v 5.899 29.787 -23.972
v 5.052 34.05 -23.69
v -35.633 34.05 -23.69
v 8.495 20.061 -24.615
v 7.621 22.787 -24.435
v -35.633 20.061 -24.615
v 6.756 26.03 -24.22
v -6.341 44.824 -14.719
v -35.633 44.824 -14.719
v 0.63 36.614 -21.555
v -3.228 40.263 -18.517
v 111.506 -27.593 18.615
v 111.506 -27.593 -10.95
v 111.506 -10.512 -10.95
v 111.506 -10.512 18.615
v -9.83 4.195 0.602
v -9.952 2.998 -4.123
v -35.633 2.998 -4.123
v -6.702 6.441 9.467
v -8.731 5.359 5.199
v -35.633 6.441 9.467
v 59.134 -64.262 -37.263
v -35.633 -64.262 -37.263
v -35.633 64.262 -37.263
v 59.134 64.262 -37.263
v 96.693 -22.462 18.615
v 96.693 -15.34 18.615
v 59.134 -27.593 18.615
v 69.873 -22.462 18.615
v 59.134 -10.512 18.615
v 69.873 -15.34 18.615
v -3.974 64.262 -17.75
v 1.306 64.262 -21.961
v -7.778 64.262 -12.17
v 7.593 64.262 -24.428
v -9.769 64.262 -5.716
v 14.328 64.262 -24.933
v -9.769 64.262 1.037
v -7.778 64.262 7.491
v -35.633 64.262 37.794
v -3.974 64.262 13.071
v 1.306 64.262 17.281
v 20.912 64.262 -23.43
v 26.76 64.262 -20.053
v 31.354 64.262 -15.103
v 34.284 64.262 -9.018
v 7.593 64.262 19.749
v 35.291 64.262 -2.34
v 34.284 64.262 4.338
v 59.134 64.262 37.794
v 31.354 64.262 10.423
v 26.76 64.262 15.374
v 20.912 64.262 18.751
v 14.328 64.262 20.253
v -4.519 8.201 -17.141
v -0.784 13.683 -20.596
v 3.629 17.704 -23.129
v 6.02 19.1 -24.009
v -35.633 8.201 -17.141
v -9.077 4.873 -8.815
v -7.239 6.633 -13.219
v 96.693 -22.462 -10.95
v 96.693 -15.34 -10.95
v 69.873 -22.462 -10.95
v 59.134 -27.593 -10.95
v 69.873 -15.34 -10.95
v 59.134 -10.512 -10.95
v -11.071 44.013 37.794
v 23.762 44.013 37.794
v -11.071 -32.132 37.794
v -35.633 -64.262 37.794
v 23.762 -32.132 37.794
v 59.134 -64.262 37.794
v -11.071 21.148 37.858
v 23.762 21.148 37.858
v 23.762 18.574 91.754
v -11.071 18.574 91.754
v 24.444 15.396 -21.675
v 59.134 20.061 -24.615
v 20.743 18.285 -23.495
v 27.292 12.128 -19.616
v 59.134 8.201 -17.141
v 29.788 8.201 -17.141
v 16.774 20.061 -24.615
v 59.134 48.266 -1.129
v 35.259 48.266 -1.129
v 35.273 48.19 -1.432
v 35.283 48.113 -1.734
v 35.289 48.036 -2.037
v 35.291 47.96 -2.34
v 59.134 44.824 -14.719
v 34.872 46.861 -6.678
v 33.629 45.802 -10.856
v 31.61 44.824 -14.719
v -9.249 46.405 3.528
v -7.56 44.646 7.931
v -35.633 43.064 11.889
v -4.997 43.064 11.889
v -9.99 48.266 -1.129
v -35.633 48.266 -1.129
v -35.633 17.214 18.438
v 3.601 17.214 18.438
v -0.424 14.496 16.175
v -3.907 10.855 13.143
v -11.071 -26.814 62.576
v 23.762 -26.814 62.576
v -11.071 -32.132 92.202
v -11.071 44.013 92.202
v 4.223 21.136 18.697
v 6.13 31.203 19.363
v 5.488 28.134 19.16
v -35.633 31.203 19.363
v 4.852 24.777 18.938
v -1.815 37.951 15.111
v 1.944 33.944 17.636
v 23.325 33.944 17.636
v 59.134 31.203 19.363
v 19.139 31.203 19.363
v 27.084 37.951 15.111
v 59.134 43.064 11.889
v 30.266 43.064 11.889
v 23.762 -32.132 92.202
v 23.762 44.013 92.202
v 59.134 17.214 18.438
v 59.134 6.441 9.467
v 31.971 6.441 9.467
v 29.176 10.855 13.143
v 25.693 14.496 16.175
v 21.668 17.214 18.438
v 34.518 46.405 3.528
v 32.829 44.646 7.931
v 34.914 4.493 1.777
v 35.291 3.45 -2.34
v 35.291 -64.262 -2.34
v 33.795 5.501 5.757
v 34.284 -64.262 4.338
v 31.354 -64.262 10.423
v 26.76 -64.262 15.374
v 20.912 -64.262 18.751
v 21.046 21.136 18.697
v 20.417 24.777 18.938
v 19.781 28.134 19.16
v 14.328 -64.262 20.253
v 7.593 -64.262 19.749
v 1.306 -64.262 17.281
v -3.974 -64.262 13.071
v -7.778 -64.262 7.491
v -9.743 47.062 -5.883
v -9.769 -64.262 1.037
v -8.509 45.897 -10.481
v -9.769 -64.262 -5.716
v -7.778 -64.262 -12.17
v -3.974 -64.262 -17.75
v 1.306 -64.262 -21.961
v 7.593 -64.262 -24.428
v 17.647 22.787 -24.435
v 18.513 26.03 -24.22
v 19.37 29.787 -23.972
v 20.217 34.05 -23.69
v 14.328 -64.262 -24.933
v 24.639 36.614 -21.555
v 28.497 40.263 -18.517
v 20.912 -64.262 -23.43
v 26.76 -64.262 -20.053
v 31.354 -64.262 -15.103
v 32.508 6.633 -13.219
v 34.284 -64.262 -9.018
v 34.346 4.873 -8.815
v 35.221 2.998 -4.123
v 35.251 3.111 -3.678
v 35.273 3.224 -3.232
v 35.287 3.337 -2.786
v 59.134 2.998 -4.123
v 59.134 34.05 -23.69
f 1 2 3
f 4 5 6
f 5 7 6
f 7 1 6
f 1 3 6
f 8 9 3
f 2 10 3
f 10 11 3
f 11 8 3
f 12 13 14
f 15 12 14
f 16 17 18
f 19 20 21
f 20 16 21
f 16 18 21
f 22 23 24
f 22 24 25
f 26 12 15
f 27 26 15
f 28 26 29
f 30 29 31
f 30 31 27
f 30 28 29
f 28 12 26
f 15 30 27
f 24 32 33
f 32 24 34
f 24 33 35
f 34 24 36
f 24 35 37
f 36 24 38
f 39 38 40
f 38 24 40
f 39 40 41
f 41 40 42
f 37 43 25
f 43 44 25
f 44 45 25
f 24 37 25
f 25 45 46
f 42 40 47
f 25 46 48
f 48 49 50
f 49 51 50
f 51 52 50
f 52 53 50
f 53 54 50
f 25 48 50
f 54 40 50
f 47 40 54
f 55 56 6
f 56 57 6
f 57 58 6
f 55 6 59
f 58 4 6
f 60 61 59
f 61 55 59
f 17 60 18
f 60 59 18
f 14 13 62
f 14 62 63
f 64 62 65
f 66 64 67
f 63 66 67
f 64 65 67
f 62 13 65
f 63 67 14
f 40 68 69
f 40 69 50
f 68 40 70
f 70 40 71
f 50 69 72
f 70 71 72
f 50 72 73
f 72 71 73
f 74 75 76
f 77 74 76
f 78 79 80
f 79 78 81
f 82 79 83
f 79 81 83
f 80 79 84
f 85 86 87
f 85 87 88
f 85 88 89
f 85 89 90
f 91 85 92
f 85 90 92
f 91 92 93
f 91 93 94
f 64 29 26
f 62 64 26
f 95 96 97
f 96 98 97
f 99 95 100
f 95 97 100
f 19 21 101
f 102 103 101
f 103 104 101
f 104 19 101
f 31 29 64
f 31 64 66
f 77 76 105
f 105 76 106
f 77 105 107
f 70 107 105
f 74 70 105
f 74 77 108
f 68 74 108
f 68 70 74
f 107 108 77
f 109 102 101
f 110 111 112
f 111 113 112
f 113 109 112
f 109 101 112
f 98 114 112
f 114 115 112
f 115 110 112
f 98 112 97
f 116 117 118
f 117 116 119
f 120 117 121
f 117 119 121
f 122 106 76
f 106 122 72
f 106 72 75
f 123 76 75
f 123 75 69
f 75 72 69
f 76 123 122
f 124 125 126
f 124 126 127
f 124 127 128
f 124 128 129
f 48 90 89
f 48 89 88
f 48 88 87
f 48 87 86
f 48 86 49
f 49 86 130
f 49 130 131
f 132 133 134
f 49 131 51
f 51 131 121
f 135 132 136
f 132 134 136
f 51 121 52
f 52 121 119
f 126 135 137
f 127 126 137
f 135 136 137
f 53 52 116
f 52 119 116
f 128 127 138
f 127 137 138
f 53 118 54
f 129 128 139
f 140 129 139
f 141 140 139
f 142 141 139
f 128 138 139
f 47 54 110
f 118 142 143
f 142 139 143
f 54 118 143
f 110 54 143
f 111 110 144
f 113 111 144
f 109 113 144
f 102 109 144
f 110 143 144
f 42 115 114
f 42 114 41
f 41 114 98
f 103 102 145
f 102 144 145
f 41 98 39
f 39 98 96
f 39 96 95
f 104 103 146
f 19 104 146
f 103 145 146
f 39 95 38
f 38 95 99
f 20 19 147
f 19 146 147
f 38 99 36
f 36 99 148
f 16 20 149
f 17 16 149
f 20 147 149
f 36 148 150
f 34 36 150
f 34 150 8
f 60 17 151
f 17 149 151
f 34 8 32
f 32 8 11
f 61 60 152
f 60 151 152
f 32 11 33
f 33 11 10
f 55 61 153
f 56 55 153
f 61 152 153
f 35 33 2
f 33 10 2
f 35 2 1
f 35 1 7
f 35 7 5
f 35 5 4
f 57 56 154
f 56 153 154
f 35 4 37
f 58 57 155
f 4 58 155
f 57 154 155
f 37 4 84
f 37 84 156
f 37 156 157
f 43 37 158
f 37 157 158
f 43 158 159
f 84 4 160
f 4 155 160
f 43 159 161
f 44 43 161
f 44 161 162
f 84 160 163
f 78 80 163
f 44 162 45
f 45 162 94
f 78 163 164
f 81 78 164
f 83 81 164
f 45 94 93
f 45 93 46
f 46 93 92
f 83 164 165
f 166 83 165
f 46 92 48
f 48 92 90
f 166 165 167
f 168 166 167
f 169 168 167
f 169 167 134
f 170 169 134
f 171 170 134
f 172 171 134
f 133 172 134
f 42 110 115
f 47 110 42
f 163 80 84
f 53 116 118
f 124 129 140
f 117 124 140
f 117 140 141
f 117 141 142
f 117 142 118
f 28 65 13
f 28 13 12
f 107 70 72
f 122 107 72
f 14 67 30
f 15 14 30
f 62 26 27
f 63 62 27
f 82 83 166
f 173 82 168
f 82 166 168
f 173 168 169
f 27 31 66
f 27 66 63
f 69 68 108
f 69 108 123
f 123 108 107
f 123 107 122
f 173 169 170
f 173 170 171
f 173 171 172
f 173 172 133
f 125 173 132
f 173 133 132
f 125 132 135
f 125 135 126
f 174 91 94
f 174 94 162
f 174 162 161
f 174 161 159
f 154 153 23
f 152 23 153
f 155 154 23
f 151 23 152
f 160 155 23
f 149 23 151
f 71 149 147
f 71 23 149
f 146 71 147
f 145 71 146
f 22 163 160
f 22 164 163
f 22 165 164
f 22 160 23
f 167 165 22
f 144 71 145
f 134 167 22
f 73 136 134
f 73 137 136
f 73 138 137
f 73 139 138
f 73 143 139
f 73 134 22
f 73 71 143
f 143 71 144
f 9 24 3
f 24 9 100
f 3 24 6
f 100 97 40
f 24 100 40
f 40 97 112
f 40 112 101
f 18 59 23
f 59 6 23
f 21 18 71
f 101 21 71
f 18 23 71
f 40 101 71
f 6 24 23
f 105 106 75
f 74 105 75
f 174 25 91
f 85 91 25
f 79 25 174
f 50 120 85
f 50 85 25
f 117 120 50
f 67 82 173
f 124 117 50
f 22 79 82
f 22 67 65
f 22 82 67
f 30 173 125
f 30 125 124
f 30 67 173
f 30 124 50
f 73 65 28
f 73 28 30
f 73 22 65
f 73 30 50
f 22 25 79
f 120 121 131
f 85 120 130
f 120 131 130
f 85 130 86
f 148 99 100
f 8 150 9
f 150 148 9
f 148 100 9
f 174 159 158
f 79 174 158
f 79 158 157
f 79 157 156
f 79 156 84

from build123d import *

# Parameters (mm, degrees)
F0_W      = 94.7674
F0_H      = 75.057
F1_DEPTH  = 64.262
F2_W      = 34.8323993385
F2_H      = 76.1452428997
F3_DEPTH  = 92.202
F4_W      = 17.0815913007
F4_H      = 29.5642912388
F5_DEPTH  = 111.506
F6_W      = 26.8206745386
F6_H      = 7.122894749
F7_DEPTH  = 117.3734
F8_R      = 22.6565007862
F9_DEPTH  = 114.554
F11_DEPTH = 73.406
F13_DEPTH = 151.384


with BuildPart() as f1:
    # F0 (on Front) → F1 (new body, symmetric)
    with BuildSketch(Plane.XZ):
        with Locations((11.7503735555, 0.2659336123)):
            Rectangle(F0_W, F0_H)
    extrude(amount=F1_DEPTH, both=True)

    # F2 (on Top) → F3 (join)
    with BuildSketch(Plane.XY):
        with Locations((6.345430389, 5.9404056519)):
            Rectangle(F2_W, F2_H)
    extrude(amount=F3_DEPTH)

    # F4 (on Right) → F5 (join)
    with BuildSketch(Plane.YZ):
        with Locations((-19.0525432117, 3.8324072957)):
            Rectangle(F4_W, F4_H)
    extrude(amount=F5_DEPTH)

    # F6 (on face) → F7 (cut)
    with BuildSketch(Plane.XY.offset(18.6145529151)):
        with Locations((83.2830891013, -18.9009504393)):
            Rectangle(F6_W, F6_H)
    extrude(amount=-F7_DEPTH, mode=Mode.SUBTRACT)

    # F8 (on Front) → F9 (cut, symmetric)
    with BuildSketch(Plane.XZ):
        with Locations((12.634399347, -2.3397030309)):
            Circle(F8_R)
    extrude(amount=F9_DEPTH, both=True, mode=Mode.SUBTRACT)

    # F10 (on face) → F11 (cut, symmetric)
    with BuildSketch(Plane.YZ.offset(23.7616300583)):
        Polygon((18.5735931468, 91.7536235383), (-26.8142361042, 62.575721092), (21.1484832689, 37.8576591611), align=None)
    extrude(amount=F11_DEPTH, both=True, mode=Mode.SUBTRACT)

    # F12 (on face) → F13 (cut)
    with BuildSketch(Plane(origin=(-35.6333264445, 0, 0), x_dir=(0, -1, 0), z_dir=(-1, 0, 0))):
        Polygon((-2.9979522495, -4.1226996567), (-6.4409147017, 9.4672488049), (-17.2143011216, 18.4380255093), (-31.2030440708, 19.3630986611), (-43.0639192026, 11.8891217583), (-48.2664753528, -1.1291000534), (-44.8235129006, -14.719048515), (-34.0501264807, -23.6898252194), (-20.0613835315, -24.6148983712), (-8.2005083997, -17.1409214684), align=None)
    extrude(amount=-F13_DEPTH, mode=Mode.SUBTRACT)


solid = f1.part
